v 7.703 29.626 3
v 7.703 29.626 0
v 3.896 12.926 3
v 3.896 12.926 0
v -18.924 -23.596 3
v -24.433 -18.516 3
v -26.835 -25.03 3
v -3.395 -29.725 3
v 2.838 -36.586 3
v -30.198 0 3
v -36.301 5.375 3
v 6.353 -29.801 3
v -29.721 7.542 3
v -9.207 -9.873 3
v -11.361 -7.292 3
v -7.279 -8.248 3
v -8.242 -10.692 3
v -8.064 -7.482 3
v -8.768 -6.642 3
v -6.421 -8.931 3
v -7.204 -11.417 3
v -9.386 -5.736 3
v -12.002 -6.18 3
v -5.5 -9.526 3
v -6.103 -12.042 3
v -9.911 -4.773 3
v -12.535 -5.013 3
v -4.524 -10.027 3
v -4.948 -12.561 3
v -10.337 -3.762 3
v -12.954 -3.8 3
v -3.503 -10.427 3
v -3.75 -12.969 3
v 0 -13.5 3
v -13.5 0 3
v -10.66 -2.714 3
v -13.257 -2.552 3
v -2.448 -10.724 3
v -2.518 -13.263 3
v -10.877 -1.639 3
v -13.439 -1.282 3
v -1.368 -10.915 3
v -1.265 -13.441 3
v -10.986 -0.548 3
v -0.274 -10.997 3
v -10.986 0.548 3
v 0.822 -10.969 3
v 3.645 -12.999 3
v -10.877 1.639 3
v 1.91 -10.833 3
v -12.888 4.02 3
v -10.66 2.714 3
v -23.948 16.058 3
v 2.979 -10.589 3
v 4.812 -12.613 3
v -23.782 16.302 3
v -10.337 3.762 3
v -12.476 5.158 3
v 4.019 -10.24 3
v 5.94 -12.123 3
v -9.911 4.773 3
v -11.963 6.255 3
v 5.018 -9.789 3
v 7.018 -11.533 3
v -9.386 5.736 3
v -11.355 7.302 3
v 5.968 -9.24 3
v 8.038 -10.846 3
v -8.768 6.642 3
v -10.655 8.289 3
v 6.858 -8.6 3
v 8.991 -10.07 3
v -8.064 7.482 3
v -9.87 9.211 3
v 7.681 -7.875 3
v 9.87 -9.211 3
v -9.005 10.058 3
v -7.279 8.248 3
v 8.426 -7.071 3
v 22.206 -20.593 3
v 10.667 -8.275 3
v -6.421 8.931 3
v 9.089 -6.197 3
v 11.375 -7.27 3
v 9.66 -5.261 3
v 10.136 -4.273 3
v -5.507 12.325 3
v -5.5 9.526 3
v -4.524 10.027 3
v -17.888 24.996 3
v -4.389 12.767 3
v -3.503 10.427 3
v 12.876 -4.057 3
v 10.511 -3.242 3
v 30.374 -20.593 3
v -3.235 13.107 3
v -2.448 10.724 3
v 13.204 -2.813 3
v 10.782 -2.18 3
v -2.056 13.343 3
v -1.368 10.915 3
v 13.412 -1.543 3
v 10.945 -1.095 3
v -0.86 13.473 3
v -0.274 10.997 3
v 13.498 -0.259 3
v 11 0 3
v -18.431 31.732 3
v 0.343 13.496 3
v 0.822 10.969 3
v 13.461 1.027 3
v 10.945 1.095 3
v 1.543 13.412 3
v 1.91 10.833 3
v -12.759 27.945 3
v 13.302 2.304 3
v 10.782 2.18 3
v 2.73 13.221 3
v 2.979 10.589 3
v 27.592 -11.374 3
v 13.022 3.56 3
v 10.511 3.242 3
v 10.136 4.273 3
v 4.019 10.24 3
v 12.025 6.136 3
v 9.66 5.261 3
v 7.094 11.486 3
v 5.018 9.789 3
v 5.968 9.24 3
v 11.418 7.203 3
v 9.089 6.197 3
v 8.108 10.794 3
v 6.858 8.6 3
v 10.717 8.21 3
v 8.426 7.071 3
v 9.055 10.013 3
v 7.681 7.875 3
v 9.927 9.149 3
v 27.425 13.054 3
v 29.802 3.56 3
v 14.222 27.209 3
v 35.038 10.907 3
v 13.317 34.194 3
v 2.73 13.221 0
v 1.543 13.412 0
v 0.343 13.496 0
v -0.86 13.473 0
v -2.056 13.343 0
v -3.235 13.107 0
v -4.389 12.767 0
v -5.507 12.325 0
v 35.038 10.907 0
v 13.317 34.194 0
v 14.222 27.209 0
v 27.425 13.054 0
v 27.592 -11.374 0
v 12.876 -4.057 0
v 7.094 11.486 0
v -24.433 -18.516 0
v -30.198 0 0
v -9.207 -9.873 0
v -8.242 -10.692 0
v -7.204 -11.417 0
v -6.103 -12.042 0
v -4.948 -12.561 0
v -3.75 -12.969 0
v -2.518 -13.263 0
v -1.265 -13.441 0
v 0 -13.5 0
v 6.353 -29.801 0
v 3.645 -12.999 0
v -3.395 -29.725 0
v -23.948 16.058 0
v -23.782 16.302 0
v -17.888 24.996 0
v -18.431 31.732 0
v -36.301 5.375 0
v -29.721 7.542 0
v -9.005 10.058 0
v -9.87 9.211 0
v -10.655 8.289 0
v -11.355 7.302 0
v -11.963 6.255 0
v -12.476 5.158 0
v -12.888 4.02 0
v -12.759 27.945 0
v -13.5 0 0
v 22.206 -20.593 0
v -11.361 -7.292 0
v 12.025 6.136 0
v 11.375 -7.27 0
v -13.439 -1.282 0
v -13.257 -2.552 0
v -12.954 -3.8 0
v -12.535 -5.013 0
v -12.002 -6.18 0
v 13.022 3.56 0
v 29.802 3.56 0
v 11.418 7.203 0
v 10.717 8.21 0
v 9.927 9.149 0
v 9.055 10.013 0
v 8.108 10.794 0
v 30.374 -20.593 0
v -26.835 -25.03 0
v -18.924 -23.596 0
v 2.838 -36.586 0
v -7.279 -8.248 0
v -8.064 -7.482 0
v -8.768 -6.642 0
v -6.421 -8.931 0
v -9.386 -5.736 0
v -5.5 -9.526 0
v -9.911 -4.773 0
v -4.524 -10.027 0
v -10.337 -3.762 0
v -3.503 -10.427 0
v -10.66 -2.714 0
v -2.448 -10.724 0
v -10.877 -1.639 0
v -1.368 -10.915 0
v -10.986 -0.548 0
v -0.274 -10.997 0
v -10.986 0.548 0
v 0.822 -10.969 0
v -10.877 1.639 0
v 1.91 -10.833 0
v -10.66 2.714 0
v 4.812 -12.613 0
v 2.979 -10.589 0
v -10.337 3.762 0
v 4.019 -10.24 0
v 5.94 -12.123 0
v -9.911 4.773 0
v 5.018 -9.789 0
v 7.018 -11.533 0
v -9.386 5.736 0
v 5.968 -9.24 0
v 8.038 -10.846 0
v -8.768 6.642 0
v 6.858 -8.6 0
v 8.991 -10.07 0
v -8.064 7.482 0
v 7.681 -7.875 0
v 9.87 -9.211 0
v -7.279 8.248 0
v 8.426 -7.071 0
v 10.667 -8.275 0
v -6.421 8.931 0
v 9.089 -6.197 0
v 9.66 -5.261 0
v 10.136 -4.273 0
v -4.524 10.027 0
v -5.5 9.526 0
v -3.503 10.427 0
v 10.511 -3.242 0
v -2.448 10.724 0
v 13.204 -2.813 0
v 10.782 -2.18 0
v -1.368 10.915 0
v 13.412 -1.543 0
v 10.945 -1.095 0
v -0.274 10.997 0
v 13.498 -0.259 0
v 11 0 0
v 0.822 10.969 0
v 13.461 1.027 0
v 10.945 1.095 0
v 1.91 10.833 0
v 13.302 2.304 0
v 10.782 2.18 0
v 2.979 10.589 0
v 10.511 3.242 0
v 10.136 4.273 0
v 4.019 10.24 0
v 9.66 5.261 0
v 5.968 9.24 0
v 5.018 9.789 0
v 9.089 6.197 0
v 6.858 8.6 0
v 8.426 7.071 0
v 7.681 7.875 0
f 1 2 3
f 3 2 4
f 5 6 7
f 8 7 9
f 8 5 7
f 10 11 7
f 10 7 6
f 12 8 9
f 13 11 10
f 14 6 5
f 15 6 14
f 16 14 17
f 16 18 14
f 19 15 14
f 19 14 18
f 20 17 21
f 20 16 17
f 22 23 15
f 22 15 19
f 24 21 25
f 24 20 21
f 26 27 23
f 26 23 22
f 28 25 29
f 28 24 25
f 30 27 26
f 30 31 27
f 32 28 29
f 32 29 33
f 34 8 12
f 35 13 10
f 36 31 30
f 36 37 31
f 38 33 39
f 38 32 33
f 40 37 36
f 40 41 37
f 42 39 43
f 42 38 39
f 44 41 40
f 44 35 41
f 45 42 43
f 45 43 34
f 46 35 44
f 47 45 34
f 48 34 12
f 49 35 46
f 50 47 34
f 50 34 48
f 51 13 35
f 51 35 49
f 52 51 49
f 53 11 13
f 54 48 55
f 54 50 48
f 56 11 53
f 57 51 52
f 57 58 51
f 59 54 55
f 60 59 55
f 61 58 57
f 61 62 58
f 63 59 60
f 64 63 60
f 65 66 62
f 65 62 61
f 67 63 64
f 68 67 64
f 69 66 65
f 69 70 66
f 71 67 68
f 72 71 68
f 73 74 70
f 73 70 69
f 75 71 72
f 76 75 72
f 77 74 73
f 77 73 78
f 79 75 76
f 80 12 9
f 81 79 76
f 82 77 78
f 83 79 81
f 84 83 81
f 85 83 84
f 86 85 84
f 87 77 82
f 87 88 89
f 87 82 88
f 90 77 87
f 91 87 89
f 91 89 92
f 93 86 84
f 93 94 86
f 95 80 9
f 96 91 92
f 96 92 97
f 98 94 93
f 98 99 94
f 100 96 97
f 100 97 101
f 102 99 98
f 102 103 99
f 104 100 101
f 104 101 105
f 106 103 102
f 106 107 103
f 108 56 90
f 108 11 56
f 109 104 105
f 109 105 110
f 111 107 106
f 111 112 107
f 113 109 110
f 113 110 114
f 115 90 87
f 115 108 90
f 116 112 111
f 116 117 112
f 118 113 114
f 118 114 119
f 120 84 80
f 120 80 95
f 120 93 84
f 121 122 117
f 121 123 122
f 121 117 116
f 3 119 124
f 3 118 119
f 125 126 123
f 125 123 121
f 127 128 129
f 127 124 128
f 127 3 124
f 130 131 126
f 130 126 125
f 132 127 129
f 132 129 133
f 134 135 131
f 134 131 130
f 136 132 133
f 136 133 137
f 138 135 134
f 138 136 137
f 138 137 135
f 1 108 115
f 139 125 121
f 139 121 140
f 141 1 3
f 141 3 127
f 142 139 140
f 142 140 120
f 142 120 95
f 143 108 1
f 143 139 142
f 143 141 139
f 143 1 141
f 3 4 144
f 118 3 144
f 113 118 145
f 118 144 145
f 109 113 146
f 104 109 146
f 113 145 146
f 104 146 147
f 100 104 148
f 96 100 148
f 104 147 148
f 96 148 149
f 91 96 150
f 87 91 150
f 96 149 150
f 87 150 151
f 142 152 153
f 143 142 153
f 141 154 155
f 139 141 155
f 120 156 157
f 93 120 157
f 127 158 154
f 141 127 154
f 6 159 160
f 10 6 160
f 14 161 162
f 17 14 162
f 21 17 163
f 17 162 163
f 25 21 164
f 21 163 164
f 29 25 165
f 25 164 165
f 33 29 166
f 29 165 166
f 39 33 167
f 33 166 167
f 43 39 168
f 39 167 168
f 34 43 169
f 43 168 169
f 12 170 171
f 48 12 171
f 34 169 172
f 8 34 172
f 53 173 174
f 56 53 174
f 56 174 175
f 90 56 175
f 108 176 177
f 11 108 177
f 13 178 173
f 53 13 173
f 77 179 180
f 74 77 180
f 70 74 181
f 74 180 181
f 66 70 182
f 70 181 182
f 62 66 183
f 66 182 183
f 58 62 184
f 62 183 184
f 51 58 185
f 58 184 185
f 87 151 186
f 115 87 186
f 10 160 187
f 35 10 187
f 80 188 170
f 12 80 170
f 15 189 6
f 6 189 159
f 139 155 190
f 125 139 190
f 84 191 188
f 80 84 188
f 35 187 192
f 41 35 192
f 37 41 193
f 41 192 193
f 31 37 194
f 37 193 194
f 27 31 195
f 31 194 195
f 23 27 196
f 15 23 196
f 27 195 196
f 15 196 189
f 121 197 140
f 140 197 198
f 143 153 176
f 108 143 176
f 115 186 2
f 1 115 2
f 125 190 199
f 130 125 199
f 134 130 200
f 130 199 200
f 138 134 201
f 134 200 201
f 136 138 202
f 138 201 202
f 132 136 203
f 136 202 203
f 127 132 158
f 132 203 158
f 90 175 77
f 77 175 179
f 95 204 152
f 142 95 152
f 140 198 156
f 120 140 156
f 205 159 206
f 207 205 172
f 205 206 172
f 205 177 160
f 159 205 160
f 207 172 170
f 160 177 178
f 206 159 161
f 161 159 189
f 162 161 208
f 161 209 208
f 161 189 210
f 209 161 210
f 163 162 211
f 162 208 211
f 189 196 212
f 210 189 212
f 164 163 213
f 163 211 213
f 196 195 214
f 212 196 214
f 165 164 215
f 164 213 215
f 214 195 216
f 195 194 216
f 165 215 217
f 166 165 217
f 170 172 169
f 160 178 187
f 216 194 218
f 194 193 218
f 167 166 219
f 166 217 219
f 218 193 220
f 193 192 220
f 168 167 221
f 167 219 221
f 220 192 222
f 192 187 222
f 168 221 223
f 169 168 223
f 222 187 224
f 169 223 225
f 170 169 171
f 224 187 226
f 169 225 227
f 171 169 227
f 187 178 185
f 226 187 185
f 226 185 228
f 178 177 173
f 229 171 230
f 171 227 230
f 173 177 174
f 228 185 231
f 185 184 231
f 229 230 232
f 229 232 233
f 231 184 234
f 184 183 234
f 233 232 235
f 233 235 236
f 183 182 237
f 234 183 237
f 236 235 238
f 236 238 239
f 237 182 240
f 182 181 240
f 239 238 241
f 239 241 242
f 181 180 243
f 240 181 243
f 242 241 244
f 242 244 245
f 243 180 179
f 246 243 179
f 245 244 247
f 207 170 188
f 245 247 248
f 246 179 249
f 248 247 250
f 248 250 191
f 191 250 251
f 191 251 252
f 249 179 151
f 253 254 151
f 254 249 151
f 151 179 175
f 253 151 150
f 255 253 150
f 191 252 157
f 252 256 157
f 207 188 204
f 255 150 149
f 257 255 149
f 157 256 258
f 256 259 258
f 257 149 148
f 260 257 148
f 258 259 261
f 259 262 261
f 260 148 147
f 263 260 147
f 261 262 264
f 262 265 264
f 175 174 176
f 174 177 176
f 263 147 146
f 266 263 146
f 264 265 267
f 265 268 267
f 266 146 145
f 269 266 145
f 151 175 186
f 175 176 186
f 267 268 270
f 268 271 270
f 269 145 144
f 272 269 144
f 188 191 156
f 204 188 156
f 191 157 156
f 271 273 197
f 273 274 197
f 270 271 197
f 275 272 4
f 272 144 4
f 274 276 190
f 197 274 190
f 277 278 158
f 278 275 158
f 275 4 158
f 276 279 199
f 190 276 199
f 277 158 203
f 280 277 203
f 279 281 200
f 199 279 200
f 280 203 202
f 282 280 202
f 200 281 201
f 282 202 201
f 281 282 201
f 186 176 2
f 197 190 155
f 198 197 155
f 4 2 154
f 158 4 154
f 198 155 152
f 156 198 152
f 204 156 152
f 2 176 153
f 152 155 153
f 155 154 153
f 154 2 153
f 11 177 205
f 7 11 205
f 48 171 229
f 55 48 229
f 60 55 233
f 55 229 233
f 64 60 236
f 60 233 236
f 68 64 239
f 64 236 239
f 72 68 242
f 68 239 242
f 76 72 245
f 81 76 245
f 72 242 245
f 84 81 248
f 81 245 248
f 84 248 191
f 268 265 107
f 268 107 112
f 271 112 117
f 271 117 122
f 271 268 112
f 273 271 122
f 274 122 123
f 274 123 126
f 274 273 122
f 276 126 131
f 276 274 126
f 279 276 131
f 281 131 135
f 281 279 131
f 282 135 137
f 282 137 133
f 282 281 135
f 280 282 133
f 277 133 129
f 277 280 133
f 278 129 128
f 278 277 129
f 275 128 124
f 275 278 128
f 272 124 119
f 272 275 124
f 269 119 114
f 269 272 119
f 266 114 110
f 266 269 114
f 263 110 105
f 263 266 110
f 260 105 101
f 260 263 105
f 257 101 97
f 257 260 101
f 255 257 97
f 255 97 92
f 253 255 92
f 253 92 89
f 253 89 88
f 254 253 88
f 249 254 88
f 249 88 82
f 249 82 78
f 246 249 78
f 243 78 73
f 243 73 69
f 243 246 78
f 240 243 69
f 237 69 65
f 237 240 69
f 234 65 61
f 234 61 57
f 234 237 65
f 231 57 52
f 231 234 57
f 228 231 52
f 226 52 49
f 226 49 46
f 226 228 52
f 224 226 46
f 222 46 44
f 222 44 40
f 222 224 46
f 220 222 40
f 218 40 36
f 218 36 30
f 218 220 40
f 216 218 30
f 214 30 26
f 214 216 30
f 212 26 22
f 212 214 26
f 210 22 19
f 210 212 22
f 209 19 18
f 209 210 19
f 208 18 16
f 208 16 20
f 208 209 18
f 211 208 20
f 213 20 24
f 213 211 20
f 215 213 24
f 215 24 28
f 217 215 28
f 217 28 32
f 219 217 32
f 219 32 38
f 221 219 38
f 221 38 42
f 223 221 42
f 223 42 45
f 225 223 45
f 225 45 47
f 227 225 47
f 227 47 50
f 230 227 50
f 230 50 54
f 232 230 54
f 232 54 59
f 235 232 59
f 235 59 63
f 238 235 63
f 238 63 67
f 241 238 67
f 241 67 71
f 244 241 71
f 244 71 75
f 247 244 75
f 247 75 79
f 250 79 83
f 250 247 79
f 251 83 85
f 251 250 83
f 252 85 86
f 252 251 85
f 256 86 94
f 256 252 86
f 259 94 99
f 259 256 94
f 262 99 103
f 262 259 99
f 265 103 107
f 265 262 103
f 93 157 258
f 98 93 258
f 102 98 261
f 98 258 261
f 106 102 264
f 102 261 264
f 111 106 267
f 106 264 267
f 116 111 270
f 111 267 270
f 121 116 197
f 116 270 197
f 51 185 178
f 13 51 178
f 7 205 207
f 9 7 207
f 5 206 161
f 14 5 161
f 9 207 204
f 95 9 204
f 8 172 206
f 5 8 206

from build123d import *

# Parameters (mm, degrees)
F0_R     = 11
F1_DEPTH = 3


with BuildPart() as f1:
    # F0 (on Top) → F1 (new body)
    with BuildSketch(Plane.XY):
        Polygon((2.837694, -36.586455), (30.374383, -20.59339), (35.037605, 10.907431), (13.317207, 34.194158), (-18.431472, 31.732385), (-36.30111, 5.374778), (-26.83544, -25.029966), align=None)
        with BuildLine():
            Line((-18.923725, -23.596064), (-9.207349, -9.872929))
            ThreePointArc((-9.207349, -9.872929), (-4.948002, -12.560544), (0, -13.5))
            Line((0, -13.5), (-3.394976, -29.72536))
            Line((-3.394976, -29.72536), (-18.923725, -23.596064))
        make_face(mode=Mode.SUBTRACT)
        with BuildLine():
            Line((-24.433495, -18.516342), (-30.198042, 0))
            Line((-30.198042, 0), (-13.5, 0))
            ThreePointArc((-13.5, 0), (-12.954259, -3.799627), (-11.361161, -7.292052))
            Line((-11.361161, -7.292052), (-24.433495, -18.516342))
        make_face(mode=Mode.SUBTRACT)
        with BuildLine():
            Line((22.20563, -20.59339), (6.35273, -29.800614))
            Line((6.35273, -29.800614), (3.645024, -12.998608))
            ThreePointArc((3.645024, -12.998608), (8.03763, -10.846498), (11.37502, -7.270413))
            Line((11.37502, -7.270413), (22.20563, -20.59339))
        make_face(mode=Mode.SUBTRACT)
        with BuildLine():
            Line((29.802458, 3.559528), (27.591791, -11.373886))
            Line((27.591791, -11.373886), (12.876009, -4.056895))
            ThreePointArc((12.876009, -4.056895), (13.497511, -0.259214), (13.022279, 3.559528))
            Line((13.022279, 3.559528), (29.802458, 3.559528))
        make_face(mode=Mode.SUBTRACT)
        with BuildLine():
            Line((-23.782364, 16.302376), (-17.888175, 24.996269))
            Line((-17.888175, 24.996269), (-9.005221, 10.057634))
            ThreePointArc((-9.005221, 10.057634), (-11.35498, 7.301672), (-12.887512, 4.020203))
            Line((-12.887512, 4.020203), (-29.721297, 7.542486))
            Line((-29.721297, 7.542486), (-23.948342, 16.057559))
            Line((-23.948342, 16.057559), (-23.782364, 16.302376))
        make_face(mode=Mode.SUBTRACT)
        with BuildLine():
            Line((-12.75861, 27.945212), (7.703053, 29.626006))
            Line((7.703053, 29.626006), (3.895945, 12.925618))
            ThreePointArc((3.895945, 12.925618), (-0.85982, 13.472591), (-5.507469, 12.325493))
            Line((-5.507469, 12.325493), (-12.75861, 27.945212))
        make_face(mode=Mode.SUBTRACT)
        Circle(F0_R, mode=Mode.SUBTRACT)
        with BuildLine():
            Line((14.222467, 27.209421), (27.425496, 13.054278))
            Line((27.425496, 13.054278), (12.024924, 6.136058))
            ThreePointArc((12.024924, 6.136058), (9.926723, 9.149326), (7.094178, 11.485758))
            Line((7.094178, 11.485758), (14.222467, 27.209421))
        make_face(mode=Mode.SUBTRACT)
    extrude(amount=F1_DEPTH)


solid = f1.part
